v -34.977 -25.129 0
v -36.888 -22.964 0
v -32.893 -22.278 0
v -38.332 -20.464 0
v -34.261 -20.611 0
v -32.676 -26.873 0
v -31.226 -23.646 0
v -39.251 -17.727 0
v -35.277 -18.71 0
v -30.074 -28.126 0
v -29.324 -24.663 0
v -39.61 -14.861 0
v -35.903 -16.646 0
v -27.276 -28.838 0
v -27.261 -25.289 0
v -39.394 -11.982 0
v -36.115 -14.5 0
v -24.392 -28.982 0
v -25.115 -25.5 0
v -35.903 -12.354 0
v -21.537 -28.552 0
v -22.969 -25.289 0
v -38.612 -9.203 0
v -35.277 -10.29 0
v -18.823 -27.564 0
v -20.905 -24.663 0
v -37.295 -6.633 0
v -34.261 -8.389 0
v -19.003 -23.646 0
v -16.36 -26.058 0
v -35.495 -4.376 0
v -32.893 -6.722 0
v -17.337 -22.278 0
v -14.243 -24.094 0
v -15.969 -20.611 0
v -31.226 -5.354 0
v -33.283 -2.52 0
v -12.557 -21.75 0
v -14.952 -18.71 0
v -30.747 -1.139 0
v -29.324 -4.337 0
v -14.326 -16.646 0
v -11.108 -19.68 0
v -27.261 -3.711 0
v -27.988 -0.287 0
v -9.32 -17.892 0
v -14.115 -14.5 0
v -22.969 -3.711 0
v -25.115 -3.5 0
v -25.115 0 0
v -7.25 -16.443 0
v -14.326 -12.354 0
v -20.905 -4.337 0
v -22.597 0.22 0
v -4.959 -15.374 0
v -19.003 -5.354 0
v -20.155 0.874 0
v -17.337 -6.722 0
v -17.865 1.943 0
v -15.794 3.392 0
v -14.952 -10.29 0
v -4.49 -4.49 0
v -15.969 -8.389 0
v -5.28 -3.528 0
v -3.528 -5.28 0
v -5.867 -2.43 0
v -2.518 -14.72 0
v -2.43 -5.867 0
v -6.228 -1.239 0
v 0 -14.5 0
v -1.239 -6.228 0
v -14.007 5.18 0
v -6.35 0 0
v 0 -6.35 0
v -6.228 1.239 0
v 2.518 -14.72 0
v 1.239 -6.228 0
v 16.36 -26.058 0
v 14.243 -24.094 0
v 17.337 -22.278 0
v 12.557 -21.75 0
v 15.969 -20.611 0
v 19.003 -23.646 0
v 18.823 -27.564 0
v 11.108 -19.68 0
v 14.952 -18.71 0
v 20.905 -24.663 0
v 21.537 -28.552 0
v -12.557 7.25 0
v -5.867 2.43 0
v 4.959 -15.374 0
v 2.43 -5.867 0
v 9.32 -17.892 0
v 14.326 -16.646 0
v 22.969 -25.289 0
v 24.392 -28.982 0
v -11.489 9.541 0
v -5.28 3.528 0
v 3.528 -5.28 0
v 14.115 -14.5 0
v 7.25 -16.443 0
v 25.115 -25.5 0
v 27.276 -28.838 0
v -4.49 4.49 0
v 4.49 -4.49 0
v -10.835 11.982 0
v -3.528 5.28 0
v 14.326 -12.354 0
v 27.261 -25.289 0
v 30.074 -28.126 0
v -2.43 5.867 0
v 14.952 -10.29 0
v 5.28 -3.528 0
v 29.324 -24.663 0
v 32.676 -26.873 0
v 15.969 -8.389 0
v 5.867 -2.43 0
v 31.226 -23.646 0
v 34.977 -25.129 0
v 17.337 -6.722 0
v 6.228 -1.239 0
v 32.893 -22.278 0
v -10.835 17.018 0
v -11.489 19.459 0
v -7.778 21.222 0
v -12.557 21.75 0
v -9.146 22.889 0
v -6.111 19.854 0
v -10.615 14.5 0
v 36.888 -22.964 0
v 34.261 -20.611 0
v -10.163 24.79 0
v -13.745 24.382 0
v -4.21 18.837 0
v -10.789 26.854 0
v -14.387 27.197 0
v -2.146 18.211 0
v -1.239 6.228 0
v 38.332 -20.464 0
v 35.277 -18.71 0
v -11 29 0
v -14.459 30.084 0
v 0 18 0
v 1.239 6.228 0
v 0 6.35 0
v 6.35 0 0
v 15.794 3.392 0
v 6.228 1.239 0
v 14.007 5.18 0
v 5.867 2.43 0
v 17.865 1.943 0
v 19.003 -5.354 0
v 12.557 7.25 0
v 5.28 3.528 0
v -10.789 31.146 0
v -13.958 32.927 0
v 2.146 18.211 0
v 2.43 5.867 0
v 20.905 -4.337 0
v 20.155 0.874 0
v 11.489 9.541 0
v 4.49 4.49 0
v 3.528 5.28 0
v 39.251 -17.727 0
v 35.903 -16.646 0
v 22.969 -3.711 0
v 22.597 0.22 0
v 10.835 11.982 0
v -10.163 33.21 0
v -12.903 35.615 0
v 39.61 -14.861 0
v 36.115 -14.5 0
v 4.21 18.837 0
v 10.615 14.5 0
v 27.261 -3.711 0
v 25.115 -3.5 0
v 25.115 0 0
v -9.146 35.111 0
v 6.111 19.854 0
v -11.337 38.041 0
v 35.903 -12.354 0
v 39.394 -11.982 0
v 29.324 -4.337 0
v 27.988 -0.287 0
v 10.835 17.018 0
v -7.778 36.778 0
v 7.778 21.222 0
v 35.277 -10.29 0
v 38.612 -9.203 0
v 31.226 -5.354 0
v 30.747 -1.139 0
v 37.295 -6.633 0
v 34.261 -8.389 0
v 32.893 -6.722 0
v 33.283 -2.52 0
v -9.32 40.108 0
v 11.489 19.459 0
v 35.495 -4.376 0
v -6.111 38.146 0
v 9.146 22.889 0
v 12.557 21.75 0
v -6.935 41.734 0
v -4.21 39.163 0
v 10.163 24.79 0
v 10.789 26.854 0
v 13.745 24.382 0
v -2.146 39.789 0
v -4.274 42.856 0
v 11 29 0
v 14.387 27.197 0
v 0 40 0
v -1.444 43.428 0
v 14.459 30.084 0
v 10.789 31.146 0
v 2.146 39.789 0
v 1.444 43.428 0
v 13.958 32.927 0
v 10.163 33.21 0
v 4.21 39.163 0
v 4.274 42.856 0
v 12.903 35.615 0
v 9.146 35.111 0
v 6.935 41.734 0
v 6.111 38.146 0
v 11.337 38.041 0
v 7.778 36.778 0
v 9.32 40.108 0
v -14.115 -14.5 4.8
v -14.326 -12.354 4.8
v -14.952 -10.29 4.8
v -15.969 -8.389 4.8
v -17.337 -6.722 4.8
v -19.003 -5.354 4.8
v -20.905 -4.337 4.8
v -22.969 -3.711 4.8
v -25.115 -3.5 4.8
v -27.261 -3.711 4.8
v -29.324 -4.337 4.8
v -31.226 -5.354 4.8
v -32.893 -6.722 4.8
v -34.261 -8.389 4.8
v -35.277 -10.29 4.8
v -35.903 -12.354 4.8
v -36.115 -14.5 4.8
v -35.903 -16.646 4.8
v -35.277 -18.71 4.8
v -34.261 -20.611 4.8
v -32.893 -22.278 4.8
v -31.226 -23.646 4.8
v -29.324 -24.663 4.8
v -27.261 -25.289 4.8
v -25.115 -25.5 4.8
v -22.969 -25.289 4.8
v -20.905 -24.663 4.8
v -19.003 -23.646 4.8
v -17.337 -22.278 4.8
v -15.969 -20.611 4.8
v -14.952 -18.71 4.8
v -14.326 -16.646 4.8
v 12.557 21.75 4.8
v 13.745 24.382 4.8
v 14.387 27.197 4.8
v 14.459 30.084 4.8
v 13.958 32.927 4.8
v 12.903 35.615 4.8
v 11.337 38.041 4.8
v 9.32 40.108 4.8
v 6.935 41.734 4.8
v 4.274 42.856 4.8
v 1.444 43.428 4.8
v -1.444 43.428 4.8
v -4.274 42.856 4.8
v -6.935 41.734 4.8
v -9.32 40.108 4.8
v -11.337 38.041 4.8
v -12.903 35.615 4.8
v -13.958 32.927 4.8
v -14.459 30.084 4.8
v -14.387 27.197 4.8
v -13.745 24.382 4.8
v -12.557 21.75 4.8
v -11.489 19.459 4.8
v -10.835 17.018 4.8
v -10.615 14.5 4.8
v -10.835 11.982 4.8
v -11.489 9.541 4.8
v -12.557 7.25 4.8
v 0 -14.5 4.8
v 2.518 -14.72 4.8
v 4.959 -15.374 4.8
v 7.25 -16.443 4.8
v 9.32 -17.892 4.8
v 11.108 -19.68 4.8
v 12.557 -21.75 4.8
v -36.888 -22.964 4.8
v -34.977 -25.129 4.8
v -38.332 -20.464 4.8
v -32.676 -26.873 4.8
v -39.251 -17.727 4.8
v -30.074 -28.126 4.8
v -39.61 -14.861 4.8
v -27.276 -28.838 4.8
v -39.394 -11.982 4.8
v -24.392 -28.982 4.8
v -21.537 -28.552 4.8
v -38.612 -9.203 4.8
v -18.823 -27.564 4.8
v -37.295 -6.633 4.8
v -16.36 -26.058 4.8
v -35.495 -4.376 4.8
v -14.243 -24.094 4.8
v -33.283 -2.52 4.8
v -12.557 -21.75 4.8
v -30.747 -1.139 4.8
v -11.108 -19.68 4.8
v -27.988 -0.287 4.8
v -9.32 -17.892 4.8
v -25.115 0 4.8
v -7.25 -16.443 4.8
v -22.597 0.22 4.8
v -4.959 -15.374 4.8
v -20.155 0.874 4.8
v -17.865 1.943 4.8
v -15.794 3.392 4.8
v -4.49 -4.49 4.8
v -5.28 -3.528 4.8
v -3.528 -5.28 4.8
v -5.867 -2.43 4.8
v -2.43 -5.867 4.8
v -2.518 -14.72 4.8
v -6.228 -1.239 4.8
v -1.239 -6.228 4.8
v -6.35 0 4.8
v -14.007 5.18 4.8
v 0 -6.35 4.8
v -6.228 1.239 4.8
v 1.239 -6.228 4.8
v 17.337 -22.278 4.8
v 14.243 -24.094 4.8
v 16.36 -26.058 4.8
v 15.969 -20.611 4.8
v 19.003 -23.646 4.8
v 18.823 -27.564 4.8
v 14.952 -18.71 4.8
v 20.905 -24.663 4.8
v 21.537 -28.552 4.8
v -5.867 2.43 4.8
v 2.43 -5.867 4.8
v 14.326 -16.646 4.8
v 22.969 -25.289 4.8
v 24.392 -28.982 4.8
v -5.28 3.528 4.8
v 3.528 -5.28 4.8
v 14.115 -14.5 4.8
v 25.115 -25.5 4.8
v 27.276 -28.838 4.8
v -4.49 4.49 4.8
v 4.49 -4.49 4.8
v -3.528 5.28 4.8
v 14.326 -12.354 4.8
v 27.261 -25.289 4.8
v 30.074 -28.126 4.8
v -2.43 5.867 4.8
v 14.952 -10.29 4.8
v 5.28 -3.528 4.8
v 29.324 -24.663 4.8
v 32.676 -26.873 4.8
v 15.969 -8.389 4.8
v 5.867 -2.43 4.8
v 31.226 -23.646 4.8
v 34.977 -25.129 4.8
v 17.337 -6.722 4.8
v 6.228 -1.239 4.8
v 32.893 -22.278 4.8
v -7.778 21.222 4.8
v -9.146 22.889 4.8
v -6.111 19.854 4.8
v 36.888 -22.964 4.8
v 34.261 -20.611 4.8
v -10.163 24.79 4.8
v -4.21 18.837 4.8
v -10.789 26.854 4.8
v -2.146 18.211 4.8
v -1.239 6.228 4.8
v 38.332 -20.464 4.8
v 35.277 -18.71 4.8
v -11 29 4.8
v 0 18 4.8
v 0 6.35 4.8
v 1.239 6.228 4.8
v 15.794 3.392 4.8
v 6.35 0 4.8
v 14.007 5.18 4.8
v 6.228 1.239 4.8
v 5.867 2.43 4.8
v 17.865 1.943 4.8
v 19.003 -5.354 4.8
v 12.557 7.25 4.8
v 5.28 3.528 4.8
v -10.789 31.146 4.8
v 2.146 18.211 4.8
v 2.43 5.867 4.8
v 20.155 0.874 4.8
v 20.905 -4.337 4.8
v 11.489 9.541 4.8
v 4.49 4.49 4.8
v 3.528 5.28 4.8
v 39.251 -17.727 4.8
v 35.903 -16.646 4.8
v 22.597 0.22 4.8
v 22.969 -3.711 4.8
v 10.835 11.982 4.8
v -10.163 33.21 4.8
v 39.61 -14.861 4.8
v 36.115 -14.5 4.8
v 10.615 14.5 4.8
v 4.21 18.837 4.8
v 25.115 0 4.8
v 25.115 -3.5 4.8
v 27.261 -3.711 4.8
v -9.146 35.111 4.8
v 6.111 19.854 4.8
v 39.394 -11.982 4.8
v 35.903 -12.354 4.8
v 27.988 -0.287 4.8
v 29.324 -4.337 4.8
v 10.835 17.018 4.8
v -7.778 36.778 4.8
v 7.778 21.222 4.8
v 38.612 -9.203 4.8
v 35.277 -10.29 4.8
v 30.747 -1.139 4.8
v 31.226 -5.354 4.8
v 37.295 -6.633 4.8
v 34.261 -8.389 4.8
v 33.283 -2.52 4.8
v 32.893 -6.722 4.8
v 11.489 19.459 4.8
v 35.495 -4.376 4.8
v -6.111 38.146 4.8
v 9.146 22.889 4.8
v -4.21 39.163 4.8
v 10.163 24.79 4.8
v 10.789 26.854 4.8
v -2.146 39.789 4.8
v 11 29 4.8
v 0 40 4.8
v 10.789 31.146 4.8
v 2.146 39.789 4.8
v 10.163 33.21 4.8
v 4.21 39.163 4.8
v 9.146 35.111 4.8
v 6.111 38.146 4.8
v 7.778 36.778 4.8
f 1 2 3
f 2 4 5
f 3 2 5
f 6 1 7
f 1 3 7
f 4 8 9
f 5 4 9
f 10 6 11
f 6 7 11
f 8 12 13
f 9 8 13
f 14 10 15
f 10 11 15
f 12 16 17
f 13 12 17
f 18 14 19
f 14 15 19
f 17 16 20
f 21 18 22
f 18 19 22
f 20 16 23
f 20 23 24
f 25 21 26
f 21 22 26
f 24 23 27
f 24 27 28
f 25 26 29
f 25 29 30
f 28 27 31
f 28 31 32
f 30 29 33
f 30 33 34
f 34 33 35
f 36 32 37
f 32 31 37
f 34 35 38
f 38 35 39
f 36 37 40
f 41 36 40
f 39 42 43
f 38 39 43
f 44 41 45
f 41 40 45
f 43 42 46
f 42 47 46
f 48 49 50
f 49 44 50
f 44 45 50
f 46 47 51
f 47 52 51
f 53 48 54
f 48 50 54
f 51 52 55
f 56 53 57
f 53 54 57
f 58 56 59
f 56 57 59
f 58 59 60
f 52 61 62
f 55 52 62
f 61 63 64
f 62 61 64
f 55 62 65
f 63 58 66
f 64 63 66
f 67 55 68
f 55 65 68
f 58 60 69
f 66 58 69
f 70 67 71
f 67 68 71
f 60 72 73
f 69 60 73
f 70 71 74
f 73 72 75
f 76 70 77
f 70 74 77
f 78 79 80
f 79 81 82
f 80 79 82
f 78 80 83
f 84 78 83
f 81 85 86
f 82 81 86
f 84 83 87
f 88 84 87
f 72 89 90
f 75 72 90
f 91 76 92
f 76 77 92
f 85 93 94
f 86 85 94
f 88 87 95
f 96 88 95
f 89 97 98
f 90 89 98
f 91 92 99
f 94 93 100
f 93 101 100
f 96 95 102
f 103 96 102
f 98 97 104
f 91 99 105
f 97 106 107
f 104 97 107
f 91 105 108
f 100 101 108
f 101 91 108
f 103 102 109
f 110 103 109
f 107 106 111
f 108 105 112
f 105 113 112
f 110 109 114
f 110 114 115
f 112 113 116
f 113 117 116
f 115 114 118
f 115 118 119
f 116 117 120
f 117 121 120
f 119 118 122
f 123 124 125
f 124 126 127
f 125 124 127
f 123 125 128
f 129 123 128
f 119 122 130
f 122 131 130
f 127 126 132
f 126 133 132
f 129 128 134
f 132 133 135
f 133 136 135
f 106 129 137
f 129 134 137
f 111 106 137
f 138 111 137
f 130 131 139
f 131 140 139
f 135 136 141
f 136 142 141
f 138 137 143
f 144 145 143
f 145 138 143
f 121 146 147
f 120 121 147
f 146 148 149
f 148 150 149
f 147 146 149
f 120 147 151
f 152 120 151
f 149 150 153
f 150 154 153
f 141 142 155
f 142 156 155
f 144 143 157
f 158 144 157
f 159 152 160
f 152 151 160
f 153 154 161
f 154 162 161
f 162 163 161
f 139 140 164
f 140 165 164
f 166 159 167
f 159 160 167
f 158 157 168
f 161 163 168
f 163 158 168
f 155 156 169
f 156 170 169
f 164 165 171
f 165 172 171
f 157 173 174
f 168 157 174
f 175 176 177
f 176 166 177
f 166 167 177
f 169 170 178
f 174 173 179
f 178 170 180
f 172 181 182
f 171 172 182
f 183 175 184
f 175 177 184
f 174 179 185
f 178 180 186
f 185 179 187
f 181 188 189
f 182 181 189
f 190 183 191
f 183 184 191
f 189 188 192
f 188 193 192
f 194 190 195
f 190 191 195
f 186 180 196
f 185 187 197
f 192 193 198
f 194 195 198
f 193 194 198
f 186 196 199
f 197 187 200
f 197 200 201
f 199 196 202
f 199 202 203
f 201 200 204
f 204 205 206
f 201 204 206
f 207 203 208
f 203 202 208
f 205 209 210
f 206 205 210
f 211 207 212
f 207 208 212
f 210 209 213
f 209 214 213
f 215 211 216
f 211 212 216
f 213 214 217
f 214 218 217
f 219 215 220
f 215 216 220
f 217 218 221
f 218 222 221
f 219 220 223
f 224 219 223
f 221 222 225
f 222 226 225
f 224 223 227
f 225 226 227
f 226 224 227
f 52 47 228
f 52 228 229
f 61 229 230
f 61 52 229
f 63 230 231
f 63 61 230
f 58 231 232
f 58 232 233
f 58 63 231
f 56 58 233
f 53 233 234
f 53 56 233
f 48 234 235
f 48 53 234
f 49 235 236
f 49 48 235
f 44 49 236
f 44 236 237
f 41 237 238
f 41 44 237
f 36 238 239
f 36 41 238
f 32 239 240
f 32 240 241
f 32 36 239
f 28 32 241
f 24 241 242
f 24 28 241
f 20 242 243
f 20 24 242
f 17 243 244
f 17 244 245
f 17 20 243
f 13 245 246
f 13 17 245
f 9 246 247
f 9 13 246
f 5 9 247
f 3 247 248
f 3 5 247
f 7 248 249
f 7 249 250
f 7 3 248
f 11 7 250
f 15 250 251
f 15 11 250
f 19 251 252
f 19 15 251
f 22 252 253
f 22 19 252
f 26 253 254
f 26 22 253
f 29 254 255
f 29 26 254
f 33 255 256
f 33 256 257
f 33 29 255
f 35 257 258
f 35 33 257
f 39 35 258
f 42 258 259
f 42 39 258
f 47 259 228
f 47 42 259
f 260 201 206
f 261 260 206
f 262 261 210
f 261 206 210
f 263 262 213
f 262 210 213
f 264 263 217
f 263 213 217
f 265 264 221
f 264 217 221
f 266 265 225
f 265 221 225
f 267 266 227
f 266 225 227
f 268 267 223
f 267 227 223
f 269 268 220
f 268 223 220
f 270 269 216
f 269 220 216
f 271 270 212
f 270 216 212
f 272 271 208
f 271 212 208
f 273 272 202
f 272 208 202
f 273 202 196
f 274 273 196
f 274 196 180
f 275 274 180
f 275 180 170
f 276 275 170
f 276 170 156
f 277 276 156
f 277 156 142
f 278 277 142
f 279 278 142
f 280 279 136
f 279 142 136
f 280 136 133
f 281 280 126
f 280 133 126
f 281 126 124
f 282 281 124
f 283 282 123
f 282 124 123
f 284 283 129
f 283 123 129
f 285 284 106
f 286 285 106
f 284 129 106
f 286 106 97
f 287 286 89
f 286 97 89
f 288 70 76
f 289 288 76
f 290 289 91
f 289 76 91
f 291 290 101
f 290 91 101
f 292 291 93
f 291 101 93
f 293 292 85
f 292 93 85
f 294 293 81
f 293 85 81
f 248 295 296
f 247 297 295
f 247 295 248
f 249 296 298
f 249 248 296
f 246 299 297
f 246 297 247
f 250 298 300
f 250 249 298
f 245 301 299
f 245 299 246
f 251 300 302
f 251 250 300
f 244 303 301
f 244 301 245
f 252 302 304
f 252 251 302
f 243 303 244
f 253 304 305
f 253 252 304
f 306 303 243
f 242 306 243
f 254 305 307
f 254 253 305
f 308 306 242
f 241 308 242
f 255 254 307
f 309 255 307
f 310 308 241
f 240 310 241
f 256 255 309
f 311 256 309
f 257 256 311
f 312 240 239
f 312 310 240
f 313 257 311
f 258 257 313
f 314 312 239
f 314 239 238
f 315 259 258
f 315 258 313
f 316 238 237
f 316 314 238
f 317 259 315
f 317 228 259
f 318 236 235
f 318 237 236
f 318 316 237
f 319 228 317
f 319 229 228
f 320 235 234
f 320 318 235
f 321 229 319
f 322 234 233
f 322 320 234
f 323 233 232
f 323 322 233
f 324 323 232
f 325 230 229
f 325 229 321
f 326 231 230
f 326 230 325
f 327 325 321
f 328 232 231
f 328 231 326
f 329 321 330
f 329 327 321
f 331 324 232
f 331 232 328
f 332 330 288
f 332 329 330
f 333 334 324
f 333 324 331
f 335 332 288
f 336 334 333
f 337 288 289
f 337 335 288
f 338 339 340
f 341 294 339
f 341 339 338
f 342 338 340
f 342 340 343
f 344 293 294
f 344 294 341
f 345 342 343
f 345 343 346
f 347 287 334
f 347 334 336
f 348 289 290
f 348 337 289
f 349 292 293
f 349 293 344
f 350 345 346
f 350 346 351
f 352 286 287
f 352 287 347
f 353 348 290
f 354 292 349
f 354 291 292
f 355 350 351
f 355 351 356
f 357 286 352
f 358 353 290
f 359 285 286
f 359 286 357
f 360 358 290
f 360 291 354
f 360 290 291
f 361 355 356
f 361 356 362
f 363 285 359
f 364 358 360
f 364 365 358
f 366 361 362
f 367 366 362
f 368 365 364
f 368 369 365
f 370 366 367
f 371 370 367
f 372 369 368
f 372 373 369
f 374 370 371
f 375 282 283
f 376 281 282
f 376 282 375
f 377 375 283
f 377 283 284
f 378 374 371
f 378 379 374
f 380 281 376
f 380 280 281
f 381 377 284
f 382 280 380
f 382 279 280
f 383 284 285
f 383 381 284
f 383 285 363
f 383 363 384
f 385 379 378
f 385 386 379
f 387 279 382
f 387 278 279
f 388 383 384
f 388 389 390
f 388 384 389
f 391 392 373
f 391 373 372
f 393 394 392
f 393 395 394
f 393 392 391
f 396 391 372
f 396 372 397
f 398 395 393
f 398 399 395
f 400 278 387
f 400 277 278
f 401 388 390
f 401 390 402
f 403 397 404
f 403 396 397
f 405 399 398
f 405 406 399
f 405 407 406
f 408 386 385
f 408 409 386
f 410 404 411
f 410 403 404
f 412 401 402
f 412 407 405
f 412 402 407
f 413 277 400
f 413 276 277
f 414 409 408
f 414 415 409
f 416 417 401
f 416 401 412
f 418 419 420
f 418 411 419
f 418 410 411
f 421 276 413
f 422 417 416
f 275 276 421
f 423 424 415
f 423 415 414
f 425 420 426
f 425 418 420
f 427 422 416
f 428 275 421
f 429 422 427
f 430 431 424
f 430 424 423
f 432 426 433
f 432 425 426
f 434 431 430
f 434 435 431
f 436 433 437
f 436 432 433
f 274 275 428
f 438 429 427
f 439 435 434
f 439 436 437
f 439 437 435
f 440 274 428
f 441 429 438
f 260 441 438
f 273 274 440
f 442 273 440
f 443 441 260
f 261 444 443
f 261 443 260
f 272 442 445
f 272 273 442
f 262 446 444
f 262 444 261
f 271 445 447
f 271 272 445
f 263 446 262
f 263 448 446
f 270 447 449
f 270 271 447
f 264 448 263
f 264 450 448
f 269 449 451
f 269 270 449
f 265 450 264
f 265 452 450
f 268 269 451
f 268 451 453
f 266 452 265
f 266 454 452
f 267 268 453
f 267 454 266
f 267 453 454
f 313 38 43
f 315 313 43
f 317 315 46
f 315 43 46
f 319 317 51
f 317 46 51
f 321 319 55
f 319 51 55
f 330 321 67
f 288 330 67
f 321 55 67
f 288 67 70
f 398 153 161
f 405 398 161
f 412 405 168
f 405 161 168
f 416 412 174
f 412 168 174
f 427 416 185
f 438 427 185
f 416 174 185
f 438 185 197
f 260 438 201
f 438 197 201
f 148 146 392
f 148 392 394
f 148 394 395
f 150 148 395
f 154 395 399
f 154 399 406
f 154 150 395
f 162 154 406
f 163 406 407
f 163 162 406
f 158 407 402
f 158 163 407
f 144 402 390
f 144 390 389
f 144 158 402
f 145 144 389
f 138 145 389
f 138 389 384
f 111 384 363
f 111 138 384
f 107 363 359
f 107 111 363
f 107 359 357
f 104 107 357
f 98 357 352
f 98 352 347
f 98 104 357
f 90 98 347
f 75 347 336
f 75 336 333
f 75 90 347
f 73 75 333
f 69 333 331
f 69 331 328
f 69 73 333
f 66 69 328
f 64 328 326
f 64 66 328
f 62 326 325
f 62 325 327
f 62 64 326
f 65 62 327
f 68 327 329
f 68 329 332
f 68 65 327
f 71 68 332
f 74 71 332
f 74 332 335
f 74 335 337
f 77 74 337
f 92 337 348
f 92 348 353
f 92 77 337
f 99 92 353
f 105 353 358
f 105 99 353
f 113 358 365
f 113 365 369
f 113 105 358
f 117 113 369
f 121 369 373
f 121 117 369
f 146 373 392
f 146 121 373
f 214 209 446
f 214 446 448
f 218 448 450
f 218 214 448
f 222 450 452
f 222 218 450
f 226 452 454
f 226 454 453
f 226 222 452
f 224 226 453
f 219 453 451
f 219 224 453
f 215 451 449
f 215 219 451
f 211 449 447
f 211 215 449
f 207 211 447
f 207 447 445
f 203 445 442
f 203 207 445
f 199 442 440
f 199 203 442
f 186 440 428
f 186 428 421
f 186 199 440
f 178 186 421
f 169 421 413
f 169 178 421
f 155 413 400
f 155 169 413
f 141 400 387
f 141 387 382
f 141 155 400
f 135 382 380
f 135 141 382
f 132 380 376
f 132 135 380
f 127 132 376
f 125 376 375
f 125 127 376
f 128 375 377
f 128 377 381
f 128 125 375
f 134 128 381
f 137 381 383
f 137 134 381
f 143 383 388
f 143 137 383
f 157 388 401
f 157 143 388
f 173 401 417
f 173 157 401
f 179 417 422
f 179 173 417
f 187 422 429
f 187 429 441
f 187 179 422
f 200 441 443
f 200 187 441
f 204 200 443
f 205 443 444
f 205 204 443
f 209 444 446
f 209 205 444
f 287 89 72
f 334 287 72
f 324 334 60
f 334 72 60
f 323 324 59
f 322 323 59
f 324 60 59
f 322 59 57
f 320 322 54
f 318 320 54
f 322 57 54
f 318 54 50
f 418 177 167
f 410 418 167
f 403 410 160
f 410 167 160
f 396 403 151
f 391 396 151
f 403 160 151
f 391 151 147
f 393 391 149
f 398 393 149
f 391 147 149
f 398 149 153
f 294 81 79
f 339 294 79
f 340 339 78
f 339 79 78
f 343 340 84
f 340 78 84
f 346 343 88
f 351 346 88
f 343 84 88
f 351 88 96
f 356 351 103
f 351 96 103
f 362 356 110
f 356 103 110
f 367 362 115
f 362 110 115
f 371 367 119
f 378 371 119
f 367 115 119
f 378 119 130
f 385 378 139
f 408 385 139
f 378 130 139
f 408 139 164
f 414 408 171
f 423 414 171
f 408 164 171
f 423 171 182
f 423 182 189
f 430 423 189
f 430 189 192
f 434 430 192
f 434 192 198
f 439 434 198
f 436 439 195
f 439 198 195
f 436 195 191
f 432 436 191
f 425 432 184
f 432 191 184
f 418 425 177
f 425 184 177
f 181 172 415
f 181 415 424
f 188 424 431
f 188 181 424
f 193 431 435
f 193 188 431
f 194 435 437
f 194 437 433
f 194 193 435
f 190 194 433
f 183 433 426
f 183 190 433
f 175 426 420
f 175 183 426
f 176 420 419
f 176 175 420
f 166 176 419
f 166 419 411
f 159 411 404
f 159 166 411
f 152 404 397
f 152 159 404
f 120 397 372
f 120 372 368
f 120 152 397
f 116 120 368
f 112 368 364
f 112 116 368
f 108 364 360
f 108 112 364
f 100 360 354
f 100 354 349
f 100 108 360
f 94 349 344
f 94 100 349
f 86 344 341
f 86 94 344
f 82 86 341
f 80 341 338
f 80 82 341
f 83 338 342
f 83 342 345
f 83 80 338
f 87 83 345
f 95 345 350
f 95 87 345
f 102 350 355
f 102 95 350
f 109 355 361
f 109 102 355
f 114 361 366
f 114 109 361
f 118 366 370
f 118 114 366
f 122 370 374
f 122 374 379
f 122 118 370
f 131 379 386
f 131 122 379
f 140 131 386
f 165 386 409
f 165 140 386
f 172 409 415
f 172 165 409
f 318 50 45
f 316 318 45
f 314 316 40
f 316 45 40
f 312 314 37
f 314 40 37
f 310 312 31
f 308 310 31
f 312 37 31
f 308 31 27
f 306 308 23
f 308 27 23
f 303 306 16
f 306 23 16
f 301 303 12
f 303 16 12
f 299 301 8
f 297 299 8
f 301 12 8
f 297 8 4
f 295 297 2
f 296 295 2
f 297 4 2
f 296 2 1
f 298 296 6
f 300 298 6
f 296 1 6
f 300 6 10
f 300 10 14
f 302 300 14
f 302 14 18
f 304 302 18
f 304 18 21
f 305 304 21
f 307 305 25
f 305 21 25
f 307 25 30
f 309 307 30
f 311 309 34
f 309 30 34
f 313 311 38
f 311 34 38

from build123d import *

# Parameters (mm, degrees)
F0_R     = 6.35
F0_R_2   = 11
F1_DEPTH = 4.8


with BuildPart() as f1:
    # F0 (on Top) → F1 (new body)
    with BuildSketch(Plane.XY):
        with BuildLine():
            ThreePointArc((0, -14.5), (10.2530483272, -10.2530483272), (14.5, 0))
            ThreePointArc((14.5, 0), (14.0059244812, 3.752876154), (12.5573683549, 7.25))
            ThreePointArc((12.5573683549, 7.25), (0, 14.5), (-12.5573683549, 7.25))
            ThreePointArc((-12.5573683549, 7.25), (-12.5573683549, -7.25), (0, -14.5))
        make_face()
        Circle(F0_R, mode=Mode.SUBTRACT)
        with BuildLine():
            ThreePointArc((12.5573683549, 7.25), (14.0059244812, 3.752876154), (14.5, 0))
            ThreePointArc((14.5, 0), (10.2530483272, -10.2530483272), (0, -14.5))
            ThreePointArc((0, -14.5), (7.25, -16.4426316451), (12.5573683549, -21.75))
            ThreePointArc((12.5573683549, -21.75), (37.6721050646, -21.75), (25.1147367097, 0))
            ThreePointArc((25.1147367097, 0), (17.8647367097, 1.9426316451), (12.5573683549, 7.25))
        make_face()
        with Locations((25.1147367097, -14.5)):
            Circle(F0_R_2, mode=Mode.SUBTRACT)
        with BuildLine():
            ThreePointArc((-12.5573683549, 7.25), (0, 14.5), (12.5573683549, 7.25))
            ThreePointArc((12.5573683549, 7.25), (10.6147367097, 14.5), (12.5573683549, 21.75))
            ThreePointArc((12.5573683549, 21.75), (0, 43.5), (-12.5573683549, 21.75))
            ThreePointArc((-12.5573683549, 21.75), (-10.6147367097, 14.5), (-12.5573683549, 7.25))
        make_face()
        with Locations((0, 29)):
            Circle(F0_R_2, mode=Mode.SUBTRACT)
        with BuildLine():
            ThreePointArc((-12.5573683549, -21.75), (-7.25, -16.4426316451), (0, -14.5))
            ThreePointArc((0, -14.5), (-12.5573683549, -7.25), (-12.5573683549, 7.25))
            ThreePointArc((-12.5573683549, 7.25), (-17.8647367097, 1.9426316451), (-25.1147367097, 0))
            ThreePointArc((-25.1147367097, 0), (-37.6721050646, -21.75), (-12.5573683549, -21.75))
        make_face()
        with Locations((-25.1147367097, -14.5)):
            Circle(F0_R_2, mode=Mode.SUBTRACT)
    extrude(amount=F1_DEPTH)


solid = f1.part
